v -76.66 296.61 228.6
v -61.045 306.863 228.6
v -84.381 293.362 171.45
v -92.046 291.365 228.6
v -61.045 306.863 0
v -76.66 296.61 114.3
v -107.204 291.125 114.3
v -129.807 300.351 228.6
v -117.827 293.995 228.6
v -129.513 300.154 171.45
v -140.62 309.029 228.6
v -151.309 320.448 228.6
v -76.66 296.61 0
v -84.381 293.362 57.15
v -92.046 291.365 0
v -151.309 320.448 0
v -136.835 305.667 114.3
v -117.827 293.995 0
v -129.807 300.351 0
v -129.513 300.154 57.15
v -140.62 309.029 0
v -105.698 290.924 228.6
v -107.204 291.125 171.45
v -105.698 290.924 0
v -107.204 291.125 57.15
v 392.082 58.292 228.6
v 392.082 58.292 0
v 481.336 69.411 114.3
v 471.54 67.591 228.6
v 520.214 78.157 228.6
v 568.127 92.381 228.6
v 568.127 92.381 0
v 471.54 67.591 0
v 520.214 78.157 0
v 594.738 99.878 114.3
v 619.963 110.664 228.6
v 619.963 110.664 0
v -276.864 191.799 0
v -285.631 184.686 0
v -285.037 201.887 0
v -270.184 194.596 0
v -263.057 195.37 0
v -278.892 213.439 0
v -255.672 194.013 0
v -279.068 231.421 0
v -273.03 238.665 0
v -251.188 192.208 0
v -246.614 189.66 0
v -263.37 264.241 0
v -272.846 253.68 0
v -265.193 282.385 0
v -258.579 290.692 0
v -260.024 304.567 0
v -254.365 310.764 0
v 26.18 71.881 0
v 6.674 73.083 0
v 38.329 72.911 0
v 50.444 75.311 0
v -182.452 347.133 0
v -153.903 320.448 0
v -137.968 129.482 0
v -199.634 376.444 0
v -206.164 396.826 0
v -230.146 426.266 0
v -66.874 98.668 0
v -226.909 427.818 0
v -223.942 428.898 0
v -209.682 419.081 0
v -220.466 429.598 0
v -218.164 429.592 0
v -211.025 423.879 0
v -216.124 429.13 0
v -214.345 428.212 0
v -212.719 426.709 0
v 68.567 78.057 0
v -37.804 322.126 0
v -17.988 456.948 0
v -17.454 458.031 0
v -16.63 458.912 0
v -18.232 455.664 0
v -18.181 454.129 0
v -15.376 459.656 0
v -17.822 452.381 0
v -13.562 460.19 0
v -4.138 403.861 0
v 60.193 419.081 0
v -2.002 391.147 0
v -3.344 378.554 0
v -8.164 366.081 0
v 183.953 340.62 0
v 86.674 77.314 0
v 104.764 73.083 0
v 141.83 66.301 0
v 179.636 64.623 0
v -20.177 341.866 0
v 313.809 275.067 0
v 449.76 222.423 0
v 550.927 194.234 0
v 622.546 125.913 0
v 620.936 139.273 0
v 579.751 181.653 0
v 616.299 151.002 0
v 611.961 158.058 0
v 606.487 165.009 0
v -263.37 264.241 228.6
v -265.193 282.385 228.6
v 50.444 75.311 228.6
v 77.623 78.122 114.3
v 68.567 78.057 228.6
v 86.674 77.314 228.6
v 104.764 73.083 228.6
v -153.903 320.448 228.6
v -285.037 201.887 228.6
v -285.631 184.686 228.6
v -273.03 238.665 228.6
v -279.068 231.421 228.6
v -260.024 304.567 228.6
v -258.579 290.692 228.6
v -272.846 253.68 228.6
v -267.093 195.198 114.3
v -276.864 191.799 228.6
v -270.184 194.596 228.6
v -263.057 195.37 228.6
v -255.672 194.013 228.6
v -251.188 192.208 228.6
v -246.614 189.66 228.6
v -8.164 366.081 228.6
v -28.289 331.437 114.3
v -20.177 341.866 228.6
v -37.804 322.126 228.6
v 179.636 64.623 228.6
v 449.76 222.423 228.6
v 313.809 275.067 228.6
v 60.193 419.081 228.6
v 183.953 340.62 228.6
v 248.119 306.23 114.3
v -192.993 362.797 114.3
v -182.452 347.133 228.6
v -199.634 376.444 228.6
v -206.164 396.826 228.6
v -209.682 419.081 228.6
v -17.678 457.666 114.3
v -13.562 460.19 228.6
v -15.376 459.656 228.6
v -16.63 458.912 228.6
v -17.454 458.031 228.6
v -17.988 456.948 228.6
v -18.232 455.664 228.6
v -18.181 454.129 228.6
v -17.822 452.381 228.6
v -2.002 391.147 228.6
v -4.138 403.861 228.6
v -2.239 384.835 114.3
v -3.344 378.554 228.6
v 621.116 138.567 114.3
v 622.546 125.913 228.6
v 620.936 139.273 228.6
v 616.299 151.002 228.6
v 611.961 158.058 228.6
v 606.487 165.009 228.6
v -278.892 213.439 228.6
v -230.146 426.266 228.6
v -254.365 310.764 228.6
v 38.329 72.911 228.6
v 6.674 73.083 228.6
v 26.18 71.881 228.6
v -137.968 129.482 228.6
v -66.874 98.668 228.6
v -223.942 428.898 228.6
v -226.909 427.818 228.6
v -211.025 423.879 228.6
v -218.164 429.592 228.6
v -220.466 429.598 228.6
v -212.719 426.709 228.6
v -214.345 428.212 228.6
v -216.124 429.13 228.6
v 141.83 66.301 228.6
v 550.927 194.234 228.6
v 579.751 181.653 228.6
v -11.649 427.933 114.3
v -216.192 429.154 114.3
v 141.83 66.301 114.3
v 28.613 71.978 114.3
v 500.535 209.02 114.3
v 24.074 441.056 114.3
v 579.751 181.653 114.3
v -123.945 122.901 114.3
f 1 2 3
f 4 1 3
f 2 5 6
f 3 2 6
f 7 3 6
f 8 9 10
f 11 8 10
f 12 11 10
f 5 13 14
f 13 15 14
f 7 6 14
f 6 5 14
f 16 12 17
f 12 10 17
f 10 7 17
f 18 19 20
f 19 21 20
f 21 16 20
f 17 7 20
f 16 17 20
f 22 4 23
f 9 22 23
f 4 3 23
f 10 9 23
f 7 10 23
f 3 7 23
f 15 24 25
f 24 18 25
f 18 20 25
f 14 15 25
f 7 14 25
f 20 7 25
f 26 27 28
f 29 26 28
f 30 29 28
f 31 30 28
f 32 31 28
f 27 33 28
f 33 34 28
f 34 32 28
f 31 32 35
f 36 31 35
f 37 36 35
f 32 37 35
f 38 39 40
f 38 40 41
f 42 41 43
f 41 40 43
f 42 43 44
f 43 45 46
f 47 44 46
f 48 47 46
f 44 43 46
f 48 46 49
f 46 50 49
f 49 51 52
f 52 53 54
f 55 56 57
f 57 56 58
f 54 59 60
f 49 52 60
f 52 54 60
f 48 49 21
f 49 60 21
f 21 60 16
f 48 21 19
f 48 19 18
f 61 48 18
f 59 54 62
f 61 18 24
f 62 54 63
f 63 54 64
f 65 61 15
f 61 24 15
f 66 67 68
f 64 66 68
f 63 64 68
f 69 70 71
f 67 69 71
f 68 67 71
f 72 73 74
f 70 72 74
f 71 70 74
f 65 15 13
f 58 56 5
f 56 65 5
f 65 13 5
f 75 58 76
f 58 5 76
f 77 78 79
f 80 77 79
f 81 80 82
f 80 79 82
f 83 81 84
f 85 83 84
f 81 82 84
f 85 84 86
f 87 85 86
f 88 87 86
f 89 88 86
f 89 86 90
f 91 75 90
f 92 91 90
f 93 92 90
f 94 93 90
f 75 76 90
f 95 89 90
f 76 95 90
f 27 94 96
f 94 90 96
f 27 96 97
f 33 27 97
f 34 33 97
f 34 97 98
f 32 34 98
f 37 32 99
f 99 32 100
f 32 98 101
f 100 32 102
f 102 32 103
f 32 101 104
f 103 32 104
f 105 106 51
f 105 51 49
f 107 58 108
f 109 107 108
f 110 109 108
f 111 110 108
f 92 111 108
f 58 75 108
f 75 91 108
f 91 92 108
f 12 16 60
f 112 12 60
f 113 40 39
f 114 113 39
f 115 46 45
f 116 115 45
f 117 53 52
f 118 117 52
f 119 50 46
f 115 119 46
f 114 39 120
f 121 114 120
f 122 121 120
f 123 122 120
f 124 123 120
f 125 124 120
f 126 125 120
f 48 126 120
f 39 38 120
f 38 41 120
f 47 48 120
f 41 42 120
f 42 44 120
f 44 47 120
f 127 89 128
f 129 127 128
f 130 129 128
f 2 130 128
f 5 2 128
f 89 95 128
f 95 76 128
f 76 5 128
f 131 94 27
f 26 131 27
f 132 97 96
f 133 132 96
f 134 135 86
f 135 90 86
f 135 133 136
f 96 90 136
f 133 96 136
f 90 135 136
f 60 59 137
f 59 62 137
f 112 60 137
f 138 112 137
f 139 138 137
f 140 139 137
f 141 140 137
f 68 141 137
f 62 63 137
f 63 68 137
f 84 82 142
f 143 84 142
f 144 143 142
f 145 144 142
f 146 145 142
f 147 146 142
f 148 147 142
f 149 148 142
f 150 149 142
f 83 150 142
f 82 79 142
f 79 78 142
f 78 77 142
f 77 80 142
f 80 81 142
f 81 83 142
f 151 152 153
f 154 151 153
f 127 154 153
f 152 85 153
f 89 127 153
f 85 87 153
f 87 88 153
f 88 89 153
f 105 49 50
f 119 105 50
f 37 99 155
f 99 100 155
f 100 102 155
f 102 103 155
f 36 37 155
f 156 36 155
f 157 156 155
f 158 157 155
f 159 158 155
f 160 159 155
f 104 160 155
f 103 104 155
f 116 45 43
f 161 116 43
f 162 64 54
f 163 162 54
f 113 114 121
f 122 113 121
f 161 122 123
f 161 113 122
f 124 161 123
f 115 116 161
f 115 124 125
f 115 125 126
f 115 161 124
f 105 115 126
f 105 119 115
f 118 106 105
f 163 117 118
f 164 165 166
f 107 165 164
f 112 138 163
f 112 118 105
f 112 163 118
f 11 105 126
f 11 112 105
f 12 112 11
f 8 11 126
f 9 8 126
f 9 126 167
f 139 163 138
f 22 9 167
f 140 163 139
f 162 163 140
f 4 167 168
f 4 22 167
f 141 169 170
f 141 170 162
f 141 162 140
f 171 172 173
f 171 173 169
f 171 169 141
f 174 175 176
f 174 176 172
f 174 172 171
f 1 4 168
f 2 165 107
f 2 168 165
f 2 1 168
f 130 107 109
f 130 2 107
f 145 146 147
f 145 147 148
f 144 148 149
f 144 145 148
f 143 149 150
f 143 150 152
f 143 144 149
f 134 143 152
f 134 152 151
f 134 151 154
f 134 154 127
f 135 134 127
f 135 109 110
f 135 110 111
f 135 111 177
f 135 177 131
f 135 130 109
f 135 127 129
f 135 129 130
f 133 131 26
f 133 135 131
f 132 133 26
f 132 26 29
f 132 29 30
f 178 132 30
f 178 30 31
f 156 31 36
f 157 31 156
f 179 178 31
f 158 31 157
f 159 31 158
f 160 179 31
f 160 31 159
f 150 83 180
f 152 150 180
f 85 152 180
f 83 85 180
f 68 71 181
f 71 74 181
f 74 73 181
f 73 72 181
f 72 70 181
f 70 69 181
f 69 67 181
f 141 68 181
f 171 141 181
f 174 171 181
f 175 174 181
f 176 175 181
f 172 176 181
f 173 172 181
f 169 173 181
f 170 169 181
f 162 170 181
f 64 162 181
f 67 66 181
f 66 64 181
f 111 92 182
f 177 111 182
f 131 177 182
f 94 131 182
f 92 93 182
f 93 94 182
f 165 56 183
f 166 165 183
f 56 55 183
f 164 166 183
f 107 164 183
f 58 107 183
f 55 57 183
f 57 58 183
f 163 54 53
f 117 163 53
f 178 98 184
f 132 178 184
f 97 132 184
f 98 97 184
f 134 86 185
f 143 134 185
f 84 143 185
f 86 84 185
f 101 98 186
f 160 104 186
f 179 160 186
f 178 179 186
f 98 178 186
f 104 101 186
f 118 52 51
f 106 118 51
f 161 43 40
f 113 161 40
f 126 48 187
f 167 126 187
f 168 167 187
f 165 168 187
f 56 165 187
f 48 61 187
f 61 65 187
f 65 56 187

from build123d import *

# Parameters (mm, degrees)
BOSS_EXTRUDE1_DEPTH = 228.6


with BuildPart() as part:
    # Sketch1 → Boss-Extrude1 (new body)
    with BuildSketch(Plane.XY):
        with BuildLine():
            Line((-151.308507478, 320.448347343), (-153.902884159, 320.448347343))
            add(Edge.make_bspline(
                [(-153.902884159, 320.448347343), (-204.193593484, 355.830302978), (-209.681982797, 419.080625746)],
                knots=[0, 0, 0, 1, 1, 1], degree=2))
            add(Edge.make_bspline(
                [(-209.681982797, 419.080625746), (-212.468971889, 435.635081793), (-230.146422985, 426.26627389)],
                knots=[0, 0, 0, 1, 1, 1], degree=2))
            Line((-230.146422985, 426.26627389), (-254.364738426, 310.76353871))
            Line((-254.364738426, 310.76353871), (-260.02419987, 304.566542475))
            Line((-260.02419987, 304.566542475), (-258.578921486, 290.691869988))
            Line((-258.578921486, 290.691869988), (-265.193093483, 282.384698892))
            Line((-265.193093483, 282.384698892), (-263.369961518, 264.24078968))
            Line((-263.369961518, 264.24078968), (-272.846204191, 253.680341164))
            Line((-272.846204191, 253.680341164), (-273.030336503, 238.665049502))
            Line((-273.030336503, 238.665049502), (-279.067580784, 231.420751471))
            Line((-279.067580784, 231.420751471), (-278.892342657, 213.438930008))
            Line((-278.892342657, 213.438930008), (-285.037056209, 201.886868531))
            Line((-285.037056209, 201.886868531), (-285.631103618, 184.685583339))
            add(Edge.make_bspline(
                [(-285.631103618, 184.685583339), (-268.062935634, 203.22280378), (-246.614344295, 189.659725427)],
                knots=[0, 0, 0, 1, 1, 1], degree=2))
            add(Edge.make_bspline(
                [(-246.614344295, 189.659725427), (-127.920705679, 114.429612695), (6.673773744, 73.083350339)],
                knots=[0, 0, 0, 1, 1, 1], degree=2))
            add(Edge.make_bspline(
                [(6.673773744, 73.083350339), (28.666663993, 69.758079655), (50.443660227, 75.311339463)],
                knots=[0, 0, 0, 1, 1, 1], degree=2))
            add(Edge.make_bspline(
                [(50.443660227, 75.311339463), (77.641446166, 82.046433693), (104.763627465, 73.083350339)],
                knots=[0, 0, 0, 1, 1, 1], degree=2))
            add(Edge.make_bspline(
                [(104.763627465, 73.083350339), (141.460227891, 63.748172731), (179.63636286, 64.622561677)],
                knots=[0, 0, 0, 1, 1, 1], degree=2))
            Line((179.63636286, 64.622561677), (392.082197073, 58.29218063))
            add(Edge.make_bspline(
                [(392.082197073, 58.29218063), (482.5670898, 63.486005848), (568.127479803, 92.380936595)],
                knots=[0, 0, 0, 1, 1, 1], degree=2))
            add(Edge.make_bspline(
                [(568.127479803, 92.380936595), (595.430658845, 98.233924977), (619.963244193, 110.663717217)],
                knots=[0, 0, 0, 1, 1, 1], degree=2))
            add(Edge.make_bspline(
                [(619.963244193, 110.663717217), (629.007847964, 139.298696012), (606.486634537, 165.008668656)],
                knots=[0, 0, 0, 1, 1, 1], degree=2))
            add(Edge.make_bspline(
                [(606.486634537, 165.008668656), (580.79478885, 183.685281275), (550.927071991, 194.234435924)],
                knots=[0, 0, 0, 1, 1, 1], degree=2))
            add(Edge.make_bspline(
                [(550.927071991, 194.234435924), (500.725829633, 209.711245508), (449.760265594, 222.422706898)],
                knots=[0, 0, 0, 1, 1, 1], degree=2))
            add(Edge.make_bspline(
                [(449.760265594, 222.422706898), (241.262282516, 291.708486768), (60.192619276, 419.080625746)],
                knots=[0, 0, 0, 1, 1, 1], degree=2))
            add(Edge.make_bspline(
                [(60.192619276, 419.080625746), (24.832715259, 442.475671603), (-13.561949274, 460.190317475)],
                knots=[0, 0, 0, 1, 1, 1], degree=2))
            add(Edge.make_bspline(
                [(-13.561949274, 460.190317475), (-19.66491685, 459.046402337), (-17.821966678, 452.380802052)],
                knots=[0, 0, 0, 1, 1, 1], degree=2))
            add(Edge.make_bspline(
                [(-17.821966678, 452.380802052), (-12.318595056, 427.744919978), (-4.138222221, 403.861238748)],
                knots=[0, 0, 0, 1, 1, 1], degree=2))
            add(Edge.make_bspline(
                [(-4.138222221, 403.861238748), (1.674072586, 384.699876217), (-8.164307919, 366.08094882)],
                knots=[0, 0, 0, 1, 1, 1], degree=2))
            add(Edge.make_bspline(
                [(-8.164307919, 366.08094882), (-21.973615339, 326.401145795), (-61.04518825, 306.862929248)],
                knots=[0, 0, 0, 1, 1, 1], degree=2))
            add(Edge.make_bspline(
                [(-61.04518825, 306.862929248), (-108.230426593, 268.595120107), (-151.308507478, 320.448347343)],
                knots=[0, 0, 0, 1, 1, 1], degree=2))
        make_face()
    extrude(amount=BOSS_EXTRUDE1_DEPTH)


solid = part.part
